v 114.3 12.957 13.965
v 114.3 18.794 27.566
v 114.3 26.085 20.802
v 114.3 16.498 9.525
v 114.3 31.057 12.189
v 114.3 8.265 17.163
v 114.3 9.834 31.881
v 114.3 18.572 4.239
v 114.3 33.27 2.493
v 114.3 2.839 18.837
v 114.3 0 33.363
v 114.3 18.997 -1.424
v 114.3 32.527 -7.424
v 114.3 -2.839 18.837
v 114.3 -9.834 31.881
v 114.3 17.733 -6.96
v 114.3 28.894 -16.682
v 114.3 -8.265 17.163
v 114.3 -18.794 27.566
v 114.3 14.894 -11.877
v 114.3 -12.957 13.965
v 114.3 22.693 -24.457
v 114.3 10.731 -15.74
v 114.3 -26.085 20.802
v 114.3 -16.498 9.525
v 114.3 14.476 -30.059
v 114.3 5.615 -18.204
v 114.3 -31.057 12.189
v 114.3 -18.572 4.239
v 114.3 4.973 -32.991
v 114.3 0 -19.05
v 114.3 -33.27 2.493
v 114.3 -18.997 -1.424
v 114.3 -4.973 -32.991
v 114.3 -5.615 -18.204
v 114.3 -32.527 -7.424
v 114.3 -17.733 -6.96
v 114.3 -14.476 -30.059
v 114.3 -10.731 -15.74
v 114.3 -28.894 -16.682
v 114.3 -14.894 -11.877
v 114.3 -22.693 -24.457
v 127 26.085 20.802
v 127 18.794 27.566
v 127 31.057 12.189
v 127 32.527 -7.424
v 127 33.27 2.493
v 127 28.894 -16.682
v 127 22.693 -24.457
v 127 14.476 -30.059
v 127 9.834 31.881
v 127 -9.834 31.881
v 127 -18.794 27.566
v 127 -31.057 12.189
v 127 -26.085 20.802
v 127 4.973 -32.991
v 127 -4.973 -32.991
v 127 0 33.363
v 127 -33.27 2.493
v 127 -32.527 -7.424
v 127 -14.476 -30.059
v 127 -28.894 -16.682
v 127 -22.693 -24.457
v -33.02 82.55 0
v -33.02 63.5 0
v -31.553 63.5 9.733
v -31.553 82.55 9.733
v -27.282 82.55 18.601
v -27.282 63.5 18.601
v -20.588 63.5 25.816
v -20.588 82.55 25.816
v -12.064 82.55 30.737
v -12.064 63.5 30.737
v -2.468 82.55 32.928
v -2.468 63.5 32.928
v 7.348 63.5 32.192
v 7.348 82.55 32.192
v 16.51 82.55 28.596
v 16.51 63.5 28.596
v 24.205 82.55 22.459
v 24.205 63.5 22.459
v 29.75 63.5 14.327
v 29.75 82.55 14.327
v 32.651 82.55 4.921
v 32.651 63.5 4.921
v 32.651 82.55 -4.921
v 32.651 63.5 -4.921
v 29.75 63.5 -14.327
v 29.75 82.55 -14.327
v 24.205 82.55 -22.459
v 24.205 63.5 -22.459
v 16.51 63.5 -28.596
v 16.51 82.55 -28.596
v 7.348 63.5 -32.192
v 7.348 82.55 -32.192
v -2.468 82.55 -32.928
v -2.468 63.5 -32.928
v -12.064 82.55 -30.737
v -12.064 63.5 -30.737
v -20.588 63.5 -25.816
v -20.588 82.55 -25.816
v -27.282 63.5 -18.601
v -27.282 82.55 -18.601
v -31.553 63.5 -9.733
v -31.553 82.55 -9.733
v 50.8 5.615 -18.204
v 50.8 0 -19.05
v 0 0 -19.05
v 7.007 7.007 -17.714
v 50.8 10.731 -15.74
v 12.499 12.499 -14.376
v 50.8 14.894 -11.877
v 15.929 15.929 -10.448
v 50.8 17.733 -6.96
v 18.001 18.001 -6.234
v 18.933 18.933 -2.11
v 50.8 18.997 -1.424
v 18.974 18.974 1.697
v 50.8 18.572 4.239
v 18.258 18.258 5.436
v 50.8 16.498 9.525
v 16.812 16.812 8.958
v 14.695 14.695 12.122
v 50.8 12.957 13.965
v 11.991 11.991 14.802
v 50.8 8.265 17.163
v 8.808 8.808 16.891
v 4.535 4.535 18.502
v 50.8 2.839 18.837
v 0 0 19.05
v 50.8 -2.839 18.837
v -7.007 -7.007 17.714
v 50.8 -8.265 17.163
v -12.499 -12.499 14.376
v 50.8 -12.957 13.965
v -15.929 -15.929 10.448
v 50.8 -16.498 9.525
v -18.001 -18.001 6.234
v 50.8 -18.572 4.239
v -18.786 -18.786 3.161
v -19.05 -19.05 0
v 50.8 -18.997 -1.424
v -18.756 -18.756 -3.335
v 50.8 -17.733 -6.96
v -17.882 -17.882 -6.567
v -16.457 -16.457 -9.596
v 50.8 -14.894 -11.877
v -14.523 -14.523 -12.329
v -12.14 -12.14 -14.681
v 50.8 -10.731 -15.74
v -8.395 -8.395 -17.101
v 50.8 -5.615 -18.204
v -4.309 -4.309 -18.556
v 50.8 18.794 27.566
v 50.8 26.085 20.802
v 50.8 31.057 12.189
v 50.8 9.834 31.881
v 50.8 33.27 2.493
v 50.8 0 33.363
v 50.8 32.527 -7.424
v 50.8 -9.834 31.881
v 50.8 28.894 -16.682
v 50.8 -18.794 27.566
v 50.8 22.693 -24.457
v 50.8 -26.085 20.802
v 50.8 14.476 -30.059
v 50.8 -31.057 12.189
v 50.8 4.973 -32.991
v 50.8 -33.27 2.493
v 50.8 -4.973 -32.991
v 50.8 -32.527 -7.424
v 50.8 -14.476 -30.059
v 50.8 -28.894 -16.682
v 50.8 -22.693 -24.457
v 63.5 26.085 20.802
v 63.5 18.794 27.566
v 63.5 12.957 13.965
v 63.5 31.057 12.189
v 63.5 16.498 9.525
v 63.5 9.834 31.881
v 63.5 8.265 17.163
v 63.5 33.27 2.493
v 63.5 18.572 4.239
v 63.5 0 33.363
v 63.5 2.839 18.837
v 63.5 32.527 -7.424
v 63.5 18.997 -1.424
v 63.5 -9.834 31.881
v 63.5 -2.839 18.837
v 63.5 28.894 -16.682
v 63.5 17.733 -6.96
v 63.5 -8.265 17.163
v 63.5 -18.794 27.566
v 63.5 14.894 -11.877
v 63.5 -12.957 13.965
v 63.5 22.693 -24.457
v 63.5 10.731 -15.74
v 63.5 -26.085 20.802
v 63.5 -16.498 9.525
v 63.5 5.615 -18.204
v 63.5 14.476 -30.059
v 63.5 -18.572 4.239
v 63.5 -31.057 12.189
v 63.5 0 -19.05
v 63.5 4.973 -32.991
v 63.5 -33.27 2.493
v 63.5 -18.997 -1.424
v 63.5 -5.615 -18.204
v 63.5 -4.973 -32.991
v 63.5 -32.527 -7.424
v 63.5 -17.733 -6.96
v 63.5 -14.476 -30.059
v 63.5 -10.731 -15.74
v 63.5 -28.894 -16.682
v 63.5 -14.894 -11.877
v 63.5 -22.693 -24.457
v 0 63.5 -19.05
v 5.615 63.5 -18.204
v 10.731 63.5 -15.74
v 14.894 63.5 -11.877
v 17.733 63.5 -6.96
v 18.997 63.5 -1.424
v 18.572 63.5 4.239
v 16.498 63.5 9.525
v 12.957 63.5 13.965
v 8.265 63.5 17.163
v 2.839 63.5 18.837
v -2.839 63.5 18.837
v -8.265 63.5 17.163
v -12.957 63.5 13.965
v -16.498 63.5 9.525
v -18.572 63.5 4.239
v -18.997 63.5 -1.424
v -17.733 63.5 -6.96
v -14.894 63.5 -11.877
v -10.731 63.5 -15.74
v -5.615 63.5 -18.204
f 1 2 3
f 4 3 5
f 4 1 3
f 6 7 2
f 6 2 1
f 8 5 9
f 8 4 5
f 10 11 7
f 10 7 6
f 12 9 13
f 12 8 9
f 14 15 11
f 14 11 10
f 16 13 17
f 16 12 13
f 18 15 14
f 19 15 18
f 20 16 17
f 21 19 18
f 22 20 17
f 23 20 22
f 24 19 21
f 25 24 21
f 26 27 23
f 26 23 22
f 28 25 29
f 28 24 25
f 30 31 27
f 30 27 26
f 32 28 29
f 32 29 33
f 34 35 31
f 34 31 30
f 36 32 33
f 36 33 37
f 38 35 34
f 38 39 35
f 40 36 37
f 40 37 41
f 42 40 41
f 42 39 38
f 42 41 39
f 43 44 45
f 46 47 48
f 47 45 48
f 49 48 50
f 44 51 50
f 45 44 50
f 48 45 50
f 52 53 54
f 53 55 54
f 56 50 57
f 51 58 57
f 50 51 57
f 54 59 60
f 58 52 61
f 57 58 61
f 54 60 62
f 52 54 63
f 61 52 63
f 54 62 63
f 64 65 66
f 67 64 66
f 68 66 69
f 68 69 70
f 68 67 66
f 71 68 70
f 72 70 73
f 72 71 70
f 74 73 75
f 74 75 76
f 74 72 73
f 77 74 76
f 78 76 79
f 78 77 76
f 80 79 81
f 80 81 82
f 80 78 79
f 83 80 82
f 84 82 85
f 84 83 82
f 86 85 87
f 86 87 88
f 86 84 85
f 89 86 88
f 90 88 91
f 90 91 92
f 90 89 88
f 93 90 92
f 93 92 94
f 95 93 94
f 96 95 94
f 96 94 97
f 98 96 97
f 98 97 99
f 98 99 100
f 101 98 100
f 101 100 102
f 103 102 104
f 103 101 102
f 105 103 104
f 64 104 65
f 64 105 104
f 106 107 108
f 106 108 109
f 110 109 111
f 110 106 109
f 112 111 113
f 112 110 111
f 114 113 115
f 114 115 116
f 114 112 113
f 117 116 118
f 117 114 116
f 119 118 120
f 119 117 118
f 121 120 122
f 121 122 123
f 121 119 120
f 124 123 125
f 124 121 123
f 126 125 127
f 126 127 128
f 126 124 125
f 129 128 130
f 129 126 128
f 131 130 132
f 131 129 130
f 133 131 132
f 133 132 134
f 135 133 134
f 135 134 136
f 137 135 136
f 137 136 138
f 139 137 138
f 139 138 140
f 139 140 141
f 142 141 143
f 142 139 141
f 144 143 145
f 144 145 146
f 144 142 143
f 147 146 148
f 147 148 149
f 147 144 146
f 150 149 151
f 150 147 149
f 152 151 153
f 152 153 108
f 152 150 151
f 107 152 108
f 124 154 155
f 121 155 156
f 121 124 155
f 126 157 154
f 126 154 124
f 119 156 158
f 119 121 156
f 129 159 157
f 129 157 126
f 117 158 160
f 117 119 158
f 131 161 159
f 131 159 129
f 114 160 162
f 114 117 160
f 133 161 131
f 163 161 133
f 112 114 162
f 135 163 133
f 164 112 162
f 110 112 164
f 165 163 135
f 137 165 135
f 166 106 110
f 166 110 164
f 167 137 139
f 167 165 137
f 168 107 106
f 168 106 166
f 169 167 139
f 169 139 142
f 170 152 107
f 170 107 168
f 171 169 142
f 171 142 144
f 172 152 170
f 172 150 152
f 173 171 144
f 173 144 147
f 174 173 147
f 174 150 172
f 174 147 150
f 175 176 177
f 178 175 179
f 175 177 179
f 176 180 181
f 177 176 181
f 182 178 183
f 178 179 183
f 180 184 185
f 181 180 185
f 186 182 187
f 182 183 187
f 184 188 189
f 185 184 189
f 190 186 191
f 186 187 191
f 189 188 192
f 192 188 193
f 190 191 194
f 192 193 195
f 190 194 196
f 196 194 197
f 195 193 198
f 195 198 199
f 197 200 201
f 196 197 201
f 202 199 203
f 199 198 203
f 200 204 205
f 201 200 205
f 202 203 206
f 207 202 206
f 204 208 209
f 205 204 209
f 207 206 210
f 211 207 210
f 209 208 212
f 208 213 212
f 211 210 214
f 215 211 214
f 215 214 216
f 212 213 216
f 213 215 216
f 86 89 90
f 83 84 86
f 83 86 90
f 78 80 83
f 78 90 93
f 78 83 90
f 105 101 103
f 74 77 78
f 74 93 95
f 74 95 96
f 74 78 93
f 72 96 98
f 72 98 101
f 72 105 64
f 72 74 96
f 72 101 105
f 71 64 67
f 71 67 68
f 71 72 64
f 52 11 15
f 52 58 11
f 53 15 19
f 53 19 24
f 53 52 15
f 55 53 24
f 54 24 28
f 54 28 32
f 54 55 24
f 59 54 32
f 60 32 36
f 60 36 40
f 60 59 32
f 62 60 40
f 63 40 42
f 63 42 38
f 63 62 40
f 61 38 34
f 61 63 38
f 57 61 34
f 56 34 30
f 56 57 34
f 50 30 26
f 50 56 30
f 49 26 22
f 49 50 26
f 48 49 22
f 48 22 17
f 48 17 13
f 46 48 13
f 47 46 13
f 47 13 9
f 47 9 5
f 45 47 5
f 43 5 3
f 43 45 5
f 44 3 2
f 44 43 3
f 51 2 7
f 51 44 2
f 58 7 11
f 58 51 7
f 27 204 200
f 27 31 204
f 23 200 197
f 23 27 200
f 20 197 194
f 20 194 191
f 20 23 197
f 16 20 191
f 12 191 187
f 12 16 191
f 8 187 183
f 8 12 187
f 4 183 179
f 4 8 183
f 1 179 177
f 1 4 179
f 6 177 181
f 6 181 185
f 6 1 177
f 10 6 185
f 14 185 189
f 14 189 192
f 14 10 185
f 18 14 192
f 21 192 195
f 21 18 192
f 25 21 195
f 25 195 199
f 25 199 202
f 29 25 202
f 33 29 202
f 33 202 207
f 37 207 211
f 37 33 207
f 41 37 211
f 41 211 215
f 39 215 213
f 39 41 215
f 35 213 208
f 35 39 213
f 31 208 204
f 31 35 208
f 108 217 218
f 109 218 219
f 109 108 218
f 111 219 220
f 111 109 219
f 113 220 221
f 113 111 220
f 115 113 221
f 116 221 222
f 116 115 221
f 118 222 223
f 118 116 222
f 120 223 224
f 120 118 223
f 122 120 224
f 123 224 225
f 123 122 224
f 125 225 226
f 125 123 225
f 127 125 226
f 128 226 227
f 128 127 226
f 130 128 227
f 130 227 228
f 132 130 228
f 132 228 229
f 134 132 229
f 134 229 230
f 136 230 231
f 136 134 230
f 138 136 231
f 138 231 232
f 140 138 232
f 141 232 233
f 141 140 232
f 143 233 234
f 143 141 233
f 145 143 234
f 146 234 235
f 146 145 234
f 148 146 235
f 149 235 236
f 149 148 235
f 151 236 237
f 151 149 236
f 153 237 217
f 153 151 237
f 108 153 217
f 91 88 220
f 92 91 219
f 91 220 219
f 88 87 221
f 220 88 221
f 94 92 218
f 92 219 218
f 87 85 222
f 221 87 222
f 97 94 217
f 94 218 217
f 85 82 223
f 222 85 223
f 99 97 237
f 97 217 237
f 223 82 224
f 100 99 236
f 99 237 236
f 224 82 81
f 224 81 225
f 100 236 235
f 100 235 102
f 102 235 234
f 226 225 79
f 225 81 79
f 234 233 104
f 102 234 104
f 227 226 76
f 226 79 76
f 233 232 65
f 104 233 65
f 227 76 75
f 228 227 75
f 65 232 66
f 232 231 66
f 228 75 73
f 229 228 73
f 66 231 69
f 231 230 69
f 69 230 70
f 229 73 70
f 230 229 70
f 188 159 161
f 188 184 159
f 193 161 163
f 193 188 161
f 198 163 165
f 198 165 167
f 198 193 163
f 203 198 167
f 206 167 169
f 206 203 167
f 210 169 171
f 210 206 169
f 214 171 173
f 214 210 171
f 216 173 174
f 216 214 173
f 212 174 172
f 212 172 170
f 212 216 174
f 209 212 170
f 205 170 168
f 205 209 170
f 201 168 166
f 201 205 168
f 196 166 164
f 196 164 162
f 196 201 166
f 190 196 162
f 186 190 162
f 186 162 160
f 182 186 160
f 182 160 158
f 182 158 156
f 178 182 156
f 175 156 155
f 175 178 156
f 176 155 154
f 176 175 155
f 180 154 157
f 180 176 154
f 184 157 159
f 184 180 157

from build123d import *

# Parameters (mm, degrees)
SKETCH2_R           = 19.05
SKETCH3_R           = 33.02
BOSS_EXTRUDE1_DEPTH = 19.05
SKETCH4_W           = 12.7
SKETCH4_H           = 14.313474639


with BuildPart() as part:
    # Sweep1: sweep along a path in Sketch1
    with BuildLine(Plane.XY) as sweep1_path:
        Line((0, 82.55), (0, 0))
        Line((0, 0), (127, 0))
    # Sketch2 → Sweep1 (sweep)
    with BuildSketch(Plane(origin=(127, 0, 0), x_dir=(0, 0, -1), z_dir=(1, 0, 0))):
        Circle(SKETCH2_R)
    sweep(path=sweep1_path.line, transition=Transition.RIGHT)

    # Sketch3 → Boss-Extrude1 (add)
    with BuildSketch(Plane(origin=(0, 82.55, 0), x_dir=(1, 0, 0), z_dir=(0, 1, 0))):
        with Locations(Location((0, 0, 0), (0, 0, 180))):
            Circle(SKETCH3_R)
    extrude(amount=-BOSS_EXTRUDE1_DEPTH)

    # Sketch4 → Revolve1 (revolve)
    with BuildSketch(Plane.XY, mode=Mode.PRIVATE) as revolve1_sk:
        with Locations((120.65, 26.20673732)):
            Rectangle(SKETCH4_W, SKETCH4_H)
        with Locations((57.15, 26.20673732)):
            Rectangle(SKETCH4_W, SKETCH4_H)
    revolve(revolve1_sk.sketch.rotate(Axis((0, 0, 0), (1, 0, 0)), 90), axis=Axis((0, 0, 0), (1, 0, 0)))


solid = part.part
